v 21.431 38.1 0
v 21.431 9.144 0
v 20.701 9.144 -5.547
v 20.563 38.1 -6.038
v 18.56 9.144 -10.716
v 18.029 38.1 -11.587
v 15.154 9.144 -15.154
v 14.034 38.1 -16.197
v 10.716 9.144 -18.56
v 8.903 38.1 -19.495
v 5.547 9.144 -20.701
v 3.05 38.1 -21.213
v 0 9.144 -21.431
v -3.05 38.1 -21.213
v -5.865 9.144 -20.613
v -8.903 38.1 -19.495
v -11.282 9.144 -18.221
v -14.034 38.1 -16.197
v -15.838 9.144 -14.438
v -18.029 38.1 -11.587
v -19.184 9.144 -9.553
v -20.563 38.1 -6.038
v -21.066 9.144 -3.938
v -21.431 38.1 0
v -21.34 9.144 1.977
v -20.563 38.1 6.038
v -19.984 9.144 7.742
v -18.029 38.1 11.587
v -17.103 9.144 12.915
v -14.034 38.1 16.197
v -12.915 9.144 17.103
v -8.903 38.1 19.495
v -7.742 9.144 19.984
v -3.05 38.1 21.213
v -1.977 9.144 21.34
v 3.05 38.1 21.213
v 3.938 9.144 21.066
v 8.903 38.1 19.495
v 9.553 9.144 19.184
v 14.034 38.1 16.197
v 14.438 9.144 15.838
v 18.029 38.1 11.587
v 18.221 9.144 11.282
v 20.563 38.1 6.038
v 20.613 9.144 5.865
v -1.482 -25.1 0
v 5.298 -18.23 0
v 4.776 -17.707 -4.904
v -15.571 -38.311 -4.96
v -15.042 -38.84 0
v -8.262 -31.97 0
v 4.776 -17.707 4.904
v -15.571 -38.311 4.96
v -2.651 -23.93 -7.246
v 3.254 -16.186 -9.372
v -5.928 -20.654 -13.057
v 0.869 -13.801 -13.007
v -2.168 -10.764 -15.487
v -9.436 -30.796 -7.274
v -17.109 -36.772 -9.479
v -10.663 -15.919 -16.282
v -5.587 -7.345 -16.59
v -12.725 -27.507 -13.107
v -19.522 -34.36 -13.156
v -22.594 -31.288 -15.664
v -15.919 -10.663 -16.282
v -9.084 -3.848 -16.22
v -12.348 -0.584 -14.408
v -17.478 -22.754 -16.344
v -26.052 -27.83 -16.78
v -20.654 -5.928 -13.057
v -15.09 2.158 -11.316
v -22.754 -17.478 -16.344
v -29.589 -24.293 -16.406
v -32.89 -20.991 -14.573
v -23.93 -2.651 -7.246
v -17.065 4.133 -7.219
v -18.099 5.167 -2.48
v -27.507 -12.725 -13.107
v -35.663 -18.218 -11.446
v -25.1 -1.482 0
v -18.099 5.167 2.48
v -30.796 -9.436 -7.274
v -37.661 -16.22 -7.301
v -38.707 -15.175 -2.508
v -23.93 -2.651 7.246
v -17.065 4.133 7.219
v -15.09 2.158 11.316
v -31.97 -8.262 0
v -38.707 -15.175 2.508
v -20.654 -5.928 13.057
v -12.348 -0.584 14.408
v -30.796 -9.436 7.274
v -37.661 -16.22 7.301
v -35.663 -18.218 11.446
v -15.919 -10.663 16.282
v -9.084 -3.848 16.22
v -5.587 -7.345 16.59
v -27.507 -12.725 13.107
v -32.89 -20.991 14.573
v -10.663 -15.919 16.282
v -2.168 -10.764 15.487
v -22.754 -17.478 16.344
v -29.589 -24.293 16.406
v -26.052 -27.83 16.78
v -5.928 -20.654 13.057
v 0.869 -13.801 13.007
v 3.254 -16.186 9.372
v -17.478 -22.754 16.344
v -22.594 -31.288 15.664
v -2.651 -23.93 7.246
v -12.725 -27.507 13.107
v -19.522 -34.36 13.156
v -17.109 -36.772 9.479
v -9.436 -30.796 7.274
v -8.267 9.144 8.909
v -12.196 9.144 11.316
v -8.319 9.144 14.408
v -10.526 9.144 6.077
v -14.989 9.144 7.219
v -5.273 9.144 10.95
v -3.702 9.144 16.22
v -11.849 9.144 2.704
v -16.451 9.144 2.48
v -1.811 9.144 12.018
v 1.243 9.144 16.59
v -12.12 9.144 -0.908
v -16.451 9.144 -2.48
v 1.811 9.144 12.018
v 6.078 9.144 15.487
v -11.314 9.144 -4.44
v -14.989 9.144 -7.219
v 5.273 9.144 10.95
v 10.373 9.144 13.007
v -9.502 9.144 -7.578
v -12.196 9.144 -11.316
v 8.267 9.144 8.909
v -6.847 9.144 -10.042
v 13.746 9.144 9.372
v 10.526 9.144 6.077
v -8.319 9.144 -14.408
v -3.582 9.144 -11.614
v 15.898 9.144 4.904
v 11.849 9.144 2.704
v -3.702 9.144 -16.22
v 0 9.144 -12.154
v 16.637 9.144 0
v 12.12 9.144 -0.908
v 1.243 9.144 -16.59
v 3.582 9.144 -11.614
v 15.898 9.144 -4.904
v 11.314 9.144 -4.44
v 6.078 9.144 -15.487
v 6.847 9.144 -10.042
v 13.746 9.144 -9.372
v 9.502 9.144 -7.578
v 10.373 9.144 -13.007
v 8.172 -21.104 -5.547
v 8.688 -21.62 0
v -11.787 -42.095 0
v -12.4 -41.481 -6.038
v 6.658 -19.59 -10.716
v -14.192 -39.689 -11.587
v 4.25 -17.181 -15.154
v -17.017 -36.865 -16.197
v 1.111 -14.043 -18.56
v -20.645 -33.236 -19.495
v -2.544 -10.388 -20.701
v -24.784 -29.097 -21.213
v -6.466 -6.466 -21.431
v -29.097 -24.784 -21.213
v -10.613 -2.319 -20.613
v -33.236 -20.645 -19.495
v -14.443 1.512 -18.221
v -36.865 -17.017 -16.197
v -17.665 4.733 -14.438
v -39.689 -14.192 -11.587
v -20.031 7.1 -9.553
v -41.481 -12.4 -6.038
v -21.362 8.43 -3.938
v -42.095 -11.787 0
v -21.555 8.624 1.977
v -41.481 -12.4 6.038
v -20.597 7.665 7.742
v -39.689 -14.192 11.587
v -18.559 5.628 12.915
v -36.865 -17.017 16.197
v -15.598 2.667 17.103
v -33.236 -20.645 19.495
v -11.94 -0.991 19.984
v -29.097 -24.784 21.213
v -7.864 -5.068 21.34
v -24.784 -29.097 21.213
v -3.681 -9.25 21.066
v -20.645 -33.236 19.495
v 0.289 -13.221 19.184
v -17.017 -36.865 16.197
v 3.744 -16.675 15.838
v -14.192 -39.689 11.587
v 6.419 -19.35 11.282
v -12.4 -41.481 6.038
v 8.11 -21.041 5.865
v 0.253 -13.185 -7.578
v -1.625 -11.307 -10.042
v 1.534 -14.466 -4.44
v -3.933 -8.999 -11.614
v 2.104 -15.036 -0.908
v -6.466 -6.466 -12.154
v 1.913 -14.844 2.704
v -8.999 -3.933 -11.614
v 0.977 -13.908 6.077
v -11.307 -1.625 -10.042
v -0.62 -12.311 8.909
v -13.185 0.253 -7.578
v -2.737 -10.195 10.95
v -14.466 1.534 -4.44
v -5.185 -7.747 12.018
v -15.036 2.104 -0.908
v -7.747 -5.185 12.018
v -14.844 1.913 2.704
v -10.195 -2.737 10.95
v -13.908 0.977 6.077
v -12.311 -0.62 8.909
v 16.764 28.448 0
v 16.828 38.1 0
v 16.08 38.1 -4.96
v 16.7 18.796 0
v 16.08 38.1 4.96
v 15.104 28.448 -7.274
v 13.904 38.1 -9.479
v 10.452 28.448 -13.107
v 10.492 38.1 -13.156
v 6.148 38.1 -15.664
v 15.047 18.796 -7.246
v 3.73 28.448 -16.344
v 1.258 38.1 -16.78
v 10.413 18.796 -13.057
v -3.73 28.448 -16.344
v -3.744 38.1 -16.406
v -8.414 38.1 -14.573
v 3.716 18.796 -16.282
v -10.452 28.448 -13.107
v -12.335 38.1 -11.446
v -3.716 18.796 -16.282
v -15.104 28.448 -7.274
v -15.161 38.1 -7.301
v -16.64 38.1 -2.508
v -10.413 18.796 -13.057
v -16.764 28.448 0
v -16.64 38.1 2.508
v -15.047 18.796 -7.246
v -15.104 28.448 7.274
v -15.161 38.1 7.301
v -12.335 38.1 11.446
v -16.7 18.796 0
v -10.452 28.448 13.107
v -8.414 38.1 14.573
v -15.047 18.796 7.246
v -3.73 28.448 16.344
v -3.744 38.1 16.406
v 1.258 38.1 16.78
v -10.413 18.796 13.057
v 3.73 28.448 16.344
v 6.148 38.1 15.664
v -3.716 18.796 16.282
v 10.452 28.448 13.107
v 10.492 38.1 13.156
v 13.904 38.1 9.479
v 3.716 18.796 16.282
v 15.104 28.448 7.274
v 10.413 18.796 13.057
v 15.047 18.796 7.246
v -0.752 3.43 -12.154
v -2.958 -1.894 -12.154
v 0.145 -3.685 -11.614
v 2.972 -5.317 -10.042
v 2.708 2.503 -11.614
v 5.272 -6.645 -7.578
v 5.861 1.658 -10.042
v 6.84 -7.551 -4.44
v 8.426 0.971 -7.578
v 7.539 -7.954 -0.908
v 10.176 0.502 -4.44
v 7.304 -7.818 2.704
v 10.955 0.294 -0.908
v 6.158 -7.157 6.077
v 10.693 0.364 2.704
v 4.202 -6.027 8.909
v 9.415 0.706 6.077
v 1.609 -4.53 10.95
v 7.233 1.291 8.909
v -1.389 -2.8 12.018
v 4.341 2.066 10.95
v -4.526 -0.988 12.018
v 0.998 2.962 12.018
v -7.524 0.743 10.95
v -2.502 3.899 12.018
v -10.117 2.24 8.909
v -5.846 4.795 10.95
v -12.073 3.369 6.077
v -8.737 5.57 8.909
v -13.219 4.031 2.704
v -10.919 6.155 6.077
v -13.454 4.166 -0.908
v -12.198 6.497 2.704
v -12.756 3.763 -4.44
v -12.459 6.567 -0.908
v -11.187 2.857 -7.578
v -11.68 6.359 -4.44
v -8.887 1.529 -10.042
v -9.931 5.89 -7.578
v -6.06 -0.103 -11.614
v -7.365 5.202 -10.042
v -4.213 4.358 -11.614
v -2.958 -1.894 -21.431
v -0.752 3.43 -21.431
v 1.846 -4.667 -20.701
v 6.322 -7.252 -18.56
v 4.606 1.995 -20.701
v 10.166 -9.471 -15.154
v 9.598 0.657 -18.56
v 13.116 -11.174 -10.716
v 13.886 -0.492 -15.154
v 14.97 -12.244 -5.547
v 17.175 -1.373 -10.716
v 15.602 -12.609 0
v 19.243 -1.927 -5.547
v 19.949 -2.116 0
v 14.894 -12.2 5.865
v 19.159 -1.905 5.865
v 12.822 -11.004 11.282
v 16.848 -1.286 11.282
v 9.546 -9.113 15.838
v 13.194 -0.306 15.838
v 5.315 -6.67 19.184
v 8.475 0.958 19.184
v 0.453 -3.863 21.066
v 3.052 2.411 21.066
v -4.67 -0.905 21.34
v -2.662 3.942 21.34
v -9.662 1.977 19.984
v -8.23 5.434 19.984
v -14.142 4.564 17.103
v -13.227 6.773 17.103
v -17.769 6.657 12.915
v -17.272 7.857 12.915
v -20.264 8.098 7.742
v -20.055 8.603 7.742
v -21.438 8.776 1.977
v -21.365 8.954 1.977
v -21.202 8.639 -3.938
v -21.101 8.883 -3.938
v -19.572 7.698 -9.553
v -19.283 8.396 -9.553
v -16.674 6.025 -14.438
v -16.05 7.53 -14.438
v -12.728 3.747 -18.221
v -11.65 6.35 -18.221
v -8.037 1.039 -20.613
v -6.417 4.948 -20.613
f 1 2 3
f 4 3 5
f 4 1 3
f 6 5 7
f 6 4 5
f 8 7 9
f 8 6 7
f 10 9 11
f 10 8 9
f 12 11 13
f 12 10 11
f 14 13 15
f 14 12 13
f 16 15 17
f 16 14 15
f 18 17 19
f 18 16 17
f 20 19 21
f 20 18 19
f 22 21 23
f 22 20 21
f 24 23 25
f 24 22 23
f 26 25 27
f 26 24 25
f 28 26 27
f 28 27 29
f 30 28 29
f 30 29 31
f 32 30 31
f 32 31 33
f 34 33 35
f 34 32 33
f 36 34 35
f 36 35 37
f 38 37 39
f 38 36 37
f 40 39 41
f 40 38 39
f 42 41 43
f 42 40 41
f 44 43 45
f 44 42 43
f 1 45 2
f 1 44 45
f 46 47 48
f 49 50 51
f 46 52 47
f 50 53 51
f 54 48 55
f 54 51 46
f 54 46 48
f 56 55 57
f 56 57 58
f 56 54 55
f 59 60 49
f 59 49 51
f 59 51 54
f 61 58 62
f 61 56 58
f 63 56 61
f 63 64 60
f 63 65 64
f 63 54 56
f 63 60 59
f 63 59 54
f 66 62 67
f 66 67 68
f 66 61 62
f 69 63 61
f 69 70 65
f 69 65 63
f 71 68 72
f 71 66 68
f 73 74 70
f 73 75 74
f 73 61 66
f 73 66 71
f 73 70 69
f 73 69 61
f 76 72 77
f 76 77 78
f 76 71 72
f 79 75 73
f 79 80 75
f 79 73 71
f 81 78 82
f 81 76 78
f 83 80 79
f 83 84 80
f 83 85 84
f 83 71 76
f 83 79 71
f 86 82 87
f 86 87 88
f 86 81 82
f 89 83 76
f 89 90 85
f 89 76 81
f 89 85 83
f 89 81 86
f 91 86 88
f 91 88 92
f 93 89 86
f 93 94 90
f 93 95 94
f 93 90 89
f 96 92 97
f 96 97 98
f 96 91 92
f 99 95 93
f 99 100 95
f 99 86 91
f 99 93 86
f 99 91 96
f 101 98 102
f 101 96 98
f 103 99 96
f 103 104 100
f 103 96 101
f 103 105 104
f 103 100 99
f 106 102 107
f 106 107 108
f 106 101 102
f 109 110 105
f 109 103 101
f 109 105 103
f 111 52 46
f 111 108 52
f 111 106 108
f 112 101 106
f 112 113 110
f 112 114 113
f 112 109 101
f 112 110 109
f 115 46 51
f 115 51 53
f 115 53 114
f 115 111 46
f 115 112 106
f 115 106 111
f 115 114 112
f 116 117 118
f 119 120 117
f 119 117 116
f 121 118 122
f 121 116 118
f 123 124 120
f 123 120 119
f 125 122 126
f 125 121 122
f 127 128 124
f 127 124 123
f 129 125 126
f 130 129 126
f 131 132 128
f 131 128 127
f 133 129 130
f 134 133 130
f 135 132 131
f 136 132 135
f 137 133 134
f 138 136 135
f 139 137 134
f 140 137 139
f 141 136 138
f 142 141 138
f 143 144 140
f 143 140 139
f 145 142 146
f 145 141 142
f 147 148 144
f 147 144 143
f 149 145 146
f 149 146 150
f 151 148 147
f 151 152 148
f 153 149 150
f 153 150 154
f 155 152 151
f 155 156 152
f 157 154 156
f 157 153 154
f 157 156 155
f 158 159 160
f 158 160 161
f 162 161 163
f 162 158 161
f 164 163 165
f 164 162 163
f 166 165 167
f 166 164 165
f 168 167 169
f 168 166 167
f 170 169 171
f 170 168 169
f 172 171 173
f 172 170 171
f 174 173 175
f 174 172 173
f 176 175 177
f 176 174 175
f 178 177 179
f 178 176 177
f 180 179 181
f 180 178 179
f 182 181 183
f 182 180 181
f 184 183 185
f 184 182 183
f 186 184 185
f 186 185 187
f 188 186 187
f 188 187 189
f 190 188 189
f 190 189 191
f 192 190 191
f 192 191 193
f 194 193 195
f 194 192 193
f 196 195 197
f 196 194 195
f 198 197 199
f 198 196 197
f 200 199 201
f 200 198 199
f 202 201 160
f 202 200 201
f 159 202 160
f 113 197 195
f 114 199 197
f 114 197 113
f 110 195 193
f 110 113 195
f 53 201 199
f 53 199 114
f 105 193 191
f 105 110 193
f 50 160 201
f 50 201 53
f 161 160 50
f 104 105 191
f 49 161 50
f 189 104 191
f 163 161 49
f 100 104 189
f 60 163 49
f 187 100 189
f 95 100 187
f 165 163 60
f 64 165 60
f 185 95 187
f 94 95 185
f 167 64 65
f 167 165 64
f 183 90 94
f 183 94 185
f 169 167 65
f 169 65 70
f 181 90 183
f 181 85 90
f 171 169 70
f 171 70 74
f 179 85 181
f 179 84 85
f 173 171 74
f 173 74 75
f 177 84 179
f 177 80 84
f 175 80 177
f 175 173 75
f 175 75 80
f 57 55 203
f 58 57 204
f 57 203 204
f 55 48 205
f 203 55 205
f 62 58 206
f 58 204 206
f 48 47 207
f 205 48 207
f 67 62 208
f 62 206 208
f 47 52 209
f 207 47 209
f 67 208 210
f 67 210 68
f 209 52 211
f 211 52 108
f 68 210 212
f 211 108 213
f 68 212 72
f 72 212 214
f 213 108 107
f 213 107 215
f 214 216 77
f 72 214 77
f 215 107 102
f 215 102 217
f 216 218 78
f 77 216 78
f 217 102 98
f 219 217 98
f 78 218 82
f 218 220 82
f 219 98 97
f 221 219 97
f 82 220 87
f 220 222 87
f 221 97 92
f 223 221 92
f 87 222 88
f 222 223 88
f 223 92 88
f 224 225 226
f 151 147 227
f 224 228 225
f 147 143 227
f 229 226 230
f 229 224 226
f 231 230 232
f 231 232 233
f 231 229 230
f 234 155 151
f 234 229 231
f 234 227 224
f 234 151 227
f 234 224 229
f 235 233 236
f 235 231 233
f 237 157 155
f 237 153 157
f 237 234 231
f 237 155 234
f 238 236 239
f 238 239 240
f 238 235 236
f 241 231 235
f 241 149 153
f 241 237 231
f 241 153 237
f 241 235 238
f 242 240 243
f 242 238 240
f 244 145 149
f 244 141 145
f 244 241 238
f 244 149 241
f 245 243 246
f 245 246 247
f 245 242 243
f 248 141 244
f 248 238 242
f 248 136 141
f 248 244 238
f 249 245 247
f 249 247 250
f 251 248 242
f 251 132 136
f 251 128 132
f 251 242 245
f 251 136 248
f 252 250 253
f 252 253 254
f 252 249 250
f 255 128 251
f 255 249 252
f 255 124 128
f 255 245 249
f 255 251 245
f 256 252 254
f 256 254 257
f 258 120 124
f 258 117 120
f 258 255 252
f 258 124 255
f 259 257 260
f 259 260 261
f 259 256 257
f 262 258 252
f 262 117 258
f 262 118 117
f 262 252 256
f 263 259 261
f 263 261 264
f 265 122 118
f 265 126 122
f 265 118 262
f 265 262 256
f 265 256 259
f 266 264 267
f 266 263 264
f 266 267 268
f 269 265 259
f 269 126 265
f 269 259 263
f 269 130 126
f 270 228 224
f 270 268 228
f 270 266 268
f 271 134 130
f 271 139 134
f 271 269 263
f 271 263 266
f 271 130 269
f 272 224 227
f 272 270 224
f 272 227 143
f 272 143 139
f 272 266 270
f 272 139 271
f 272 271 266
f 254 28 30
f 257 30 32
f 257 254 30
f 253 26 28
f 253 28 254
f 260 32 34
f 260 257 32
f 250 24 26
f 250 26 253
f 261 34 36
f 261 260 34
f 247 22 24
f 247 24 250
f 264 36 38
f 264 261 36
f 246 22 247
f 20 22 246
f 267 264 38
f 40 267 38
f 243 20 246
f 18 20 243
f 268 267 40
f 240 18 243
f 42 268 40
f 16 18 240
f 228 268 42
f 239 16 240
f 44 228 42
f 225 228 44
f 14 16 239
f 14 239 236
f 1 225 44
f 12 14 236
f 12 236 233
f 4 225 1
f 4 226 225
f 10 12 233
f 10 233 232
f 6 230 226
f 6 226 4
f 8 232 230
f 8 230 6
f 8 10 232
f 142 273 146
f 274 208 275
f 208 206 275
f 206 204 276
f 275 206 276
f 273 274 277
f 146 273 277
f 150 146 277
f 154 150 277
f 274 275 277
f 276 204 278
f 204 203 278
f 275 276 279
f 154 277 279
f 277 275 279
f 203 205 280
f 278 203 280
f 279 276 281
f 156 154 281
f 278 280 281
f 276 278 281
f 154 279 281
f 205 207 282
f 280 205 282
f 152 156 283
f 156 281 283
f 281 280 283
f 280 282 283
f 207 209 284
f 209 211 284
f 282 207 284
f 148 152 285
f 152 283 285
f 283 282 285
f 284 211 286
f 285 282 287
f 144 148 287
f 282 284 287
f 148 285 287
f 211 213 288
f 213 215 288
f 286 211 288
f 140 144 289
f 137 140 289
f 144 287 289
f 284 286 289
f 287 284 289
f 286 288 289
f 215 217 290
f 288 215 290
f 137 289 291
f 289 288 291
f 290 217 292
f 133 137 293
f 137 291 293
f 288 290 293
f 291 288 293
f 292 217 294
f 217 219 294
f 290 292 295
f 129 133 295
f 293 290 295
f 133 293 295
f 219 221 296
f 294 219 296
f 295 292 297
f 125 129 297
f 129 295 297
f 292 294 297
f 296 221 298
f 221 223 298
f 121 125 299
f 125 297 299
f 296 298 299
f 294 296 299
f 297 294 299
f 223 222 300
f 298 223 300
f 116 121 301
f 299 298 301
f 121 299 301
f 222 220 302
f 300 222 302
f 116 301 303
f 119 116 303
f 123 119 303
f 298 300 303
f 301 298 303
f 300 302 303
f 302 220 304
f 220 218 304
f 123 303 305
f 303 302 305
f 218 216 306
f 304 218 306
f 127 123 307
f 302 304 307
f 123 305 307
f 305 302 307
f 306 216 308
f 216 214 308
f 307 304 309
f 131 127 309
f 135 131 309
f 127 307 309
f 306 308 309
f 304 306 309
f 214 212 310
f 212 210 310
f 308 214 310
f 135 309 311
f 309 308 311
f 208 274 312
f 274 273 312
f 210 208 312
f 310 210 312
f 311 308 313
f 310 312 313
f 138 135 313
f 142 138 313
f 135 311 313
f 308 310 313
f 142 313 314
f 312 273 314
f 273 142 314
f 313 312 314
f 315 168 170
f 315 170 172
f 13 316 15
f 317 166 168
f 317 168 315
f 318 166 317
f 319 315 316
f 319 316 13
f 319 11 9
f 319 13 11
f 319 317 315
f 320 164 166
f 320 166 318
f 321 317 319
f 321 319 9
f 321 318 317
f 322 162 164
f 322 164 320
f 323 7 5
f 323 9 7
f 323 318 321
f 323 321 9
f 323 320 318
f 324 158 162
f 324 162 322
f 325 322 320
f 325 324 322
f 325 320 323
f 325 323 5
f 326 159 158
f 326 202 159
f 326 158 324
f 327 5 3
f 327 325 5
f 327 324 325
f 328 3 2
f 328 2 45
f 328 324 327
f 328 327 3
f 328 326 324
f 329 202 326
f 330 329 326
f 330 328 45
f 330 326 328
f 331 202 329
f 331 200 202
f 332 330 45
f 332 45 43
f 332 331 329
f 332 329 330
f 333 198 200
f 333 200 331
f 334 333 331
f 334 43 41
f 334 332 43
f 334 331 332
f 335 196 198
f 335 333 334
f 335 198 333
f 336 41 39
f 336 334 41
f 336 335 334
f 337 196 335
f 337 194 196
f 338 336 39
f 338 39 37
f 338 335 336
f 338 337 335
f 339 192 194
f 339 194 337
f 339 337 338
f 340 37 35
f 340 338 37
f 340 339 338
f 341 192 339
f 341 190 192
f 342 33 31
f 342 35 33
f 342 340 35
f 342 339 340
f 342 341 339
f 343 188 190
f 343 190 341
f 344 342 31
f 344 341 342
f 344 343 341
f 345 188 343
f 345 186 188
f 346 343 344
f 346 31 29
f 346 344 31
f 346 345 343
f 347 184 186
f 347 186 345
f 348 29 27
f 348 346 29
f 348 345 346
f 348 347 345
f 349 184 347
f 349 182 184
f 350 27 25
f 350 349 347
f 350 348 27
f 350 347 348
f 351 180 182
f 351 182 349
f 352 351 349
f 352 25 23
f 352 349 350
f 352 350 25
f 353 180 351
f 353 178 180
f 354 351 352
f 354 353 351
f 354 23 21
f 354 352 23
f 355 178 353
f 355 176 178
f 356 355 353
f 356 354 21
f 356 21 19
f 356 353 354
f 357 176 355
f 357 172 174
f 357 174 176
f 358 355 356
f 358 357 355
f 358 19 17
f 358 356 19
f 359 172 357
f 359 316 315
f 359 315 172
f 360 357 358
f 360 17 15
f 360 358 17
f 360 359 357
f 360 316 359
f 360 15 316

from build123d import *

# Parameters (mm, degrees)
SKETCH3_R   = 21.43125
SKETCH3_R_2 = 12.1539


with BuildPart() as part:
    # Sketch1 → Revolve1 (revolve)
    with BuildSketch(Plane.XY):
        Polygon((-11.786586159, -42.094950568), (8.688397797, -21.619966611), (5.298351111, -18.229919926), (-15.041929003, -38.839607724), align=None)
    revolve(axis=Axis((-26.940768363, -26.940768363, 0), (0.707106781186549, 0.7071067811865461, 0)))



with BuildPart() as body_2:
    # Sketch2 → Revolve2 (revolve)
    with BuildSketch(Plane.XY):
        Polygon((16.8275, 38.1), (16.637, 9.144), (21.43125, 9.144), (21.43125, 38.1), align=None)
    revolve(axis=Axis((0, 0, 0), (0, 1, 0)))


with BuildPart() as part_1:
    add(part.part)

    add(body_2.part)  # Sweep1 merges body 2
    # Sweep1: sweep along a path in Sketch4
    with BuildLine(Plane.XY) as sweep1_path:
        ThreePointArc((-6.465784407, -6.465784407), (-1.680402618, 0.696045555), (0, 9.144))
    # Sketch3 → Sweep1 (sweep)
    with BuildSketch(Plane(origin=(-6.465784407, -6.465784407, 0), x_dir=(0, 0, -1), z_dir=(0.7071067811865488, 0.7071067811865464, 0))):
        Circle(SKETCH3_R)
        Circle(SKETCH3_R_2, mode=Mode.SUBTRACT)
    sweep(path=sweep1_path.line)


solid = part_1.part
